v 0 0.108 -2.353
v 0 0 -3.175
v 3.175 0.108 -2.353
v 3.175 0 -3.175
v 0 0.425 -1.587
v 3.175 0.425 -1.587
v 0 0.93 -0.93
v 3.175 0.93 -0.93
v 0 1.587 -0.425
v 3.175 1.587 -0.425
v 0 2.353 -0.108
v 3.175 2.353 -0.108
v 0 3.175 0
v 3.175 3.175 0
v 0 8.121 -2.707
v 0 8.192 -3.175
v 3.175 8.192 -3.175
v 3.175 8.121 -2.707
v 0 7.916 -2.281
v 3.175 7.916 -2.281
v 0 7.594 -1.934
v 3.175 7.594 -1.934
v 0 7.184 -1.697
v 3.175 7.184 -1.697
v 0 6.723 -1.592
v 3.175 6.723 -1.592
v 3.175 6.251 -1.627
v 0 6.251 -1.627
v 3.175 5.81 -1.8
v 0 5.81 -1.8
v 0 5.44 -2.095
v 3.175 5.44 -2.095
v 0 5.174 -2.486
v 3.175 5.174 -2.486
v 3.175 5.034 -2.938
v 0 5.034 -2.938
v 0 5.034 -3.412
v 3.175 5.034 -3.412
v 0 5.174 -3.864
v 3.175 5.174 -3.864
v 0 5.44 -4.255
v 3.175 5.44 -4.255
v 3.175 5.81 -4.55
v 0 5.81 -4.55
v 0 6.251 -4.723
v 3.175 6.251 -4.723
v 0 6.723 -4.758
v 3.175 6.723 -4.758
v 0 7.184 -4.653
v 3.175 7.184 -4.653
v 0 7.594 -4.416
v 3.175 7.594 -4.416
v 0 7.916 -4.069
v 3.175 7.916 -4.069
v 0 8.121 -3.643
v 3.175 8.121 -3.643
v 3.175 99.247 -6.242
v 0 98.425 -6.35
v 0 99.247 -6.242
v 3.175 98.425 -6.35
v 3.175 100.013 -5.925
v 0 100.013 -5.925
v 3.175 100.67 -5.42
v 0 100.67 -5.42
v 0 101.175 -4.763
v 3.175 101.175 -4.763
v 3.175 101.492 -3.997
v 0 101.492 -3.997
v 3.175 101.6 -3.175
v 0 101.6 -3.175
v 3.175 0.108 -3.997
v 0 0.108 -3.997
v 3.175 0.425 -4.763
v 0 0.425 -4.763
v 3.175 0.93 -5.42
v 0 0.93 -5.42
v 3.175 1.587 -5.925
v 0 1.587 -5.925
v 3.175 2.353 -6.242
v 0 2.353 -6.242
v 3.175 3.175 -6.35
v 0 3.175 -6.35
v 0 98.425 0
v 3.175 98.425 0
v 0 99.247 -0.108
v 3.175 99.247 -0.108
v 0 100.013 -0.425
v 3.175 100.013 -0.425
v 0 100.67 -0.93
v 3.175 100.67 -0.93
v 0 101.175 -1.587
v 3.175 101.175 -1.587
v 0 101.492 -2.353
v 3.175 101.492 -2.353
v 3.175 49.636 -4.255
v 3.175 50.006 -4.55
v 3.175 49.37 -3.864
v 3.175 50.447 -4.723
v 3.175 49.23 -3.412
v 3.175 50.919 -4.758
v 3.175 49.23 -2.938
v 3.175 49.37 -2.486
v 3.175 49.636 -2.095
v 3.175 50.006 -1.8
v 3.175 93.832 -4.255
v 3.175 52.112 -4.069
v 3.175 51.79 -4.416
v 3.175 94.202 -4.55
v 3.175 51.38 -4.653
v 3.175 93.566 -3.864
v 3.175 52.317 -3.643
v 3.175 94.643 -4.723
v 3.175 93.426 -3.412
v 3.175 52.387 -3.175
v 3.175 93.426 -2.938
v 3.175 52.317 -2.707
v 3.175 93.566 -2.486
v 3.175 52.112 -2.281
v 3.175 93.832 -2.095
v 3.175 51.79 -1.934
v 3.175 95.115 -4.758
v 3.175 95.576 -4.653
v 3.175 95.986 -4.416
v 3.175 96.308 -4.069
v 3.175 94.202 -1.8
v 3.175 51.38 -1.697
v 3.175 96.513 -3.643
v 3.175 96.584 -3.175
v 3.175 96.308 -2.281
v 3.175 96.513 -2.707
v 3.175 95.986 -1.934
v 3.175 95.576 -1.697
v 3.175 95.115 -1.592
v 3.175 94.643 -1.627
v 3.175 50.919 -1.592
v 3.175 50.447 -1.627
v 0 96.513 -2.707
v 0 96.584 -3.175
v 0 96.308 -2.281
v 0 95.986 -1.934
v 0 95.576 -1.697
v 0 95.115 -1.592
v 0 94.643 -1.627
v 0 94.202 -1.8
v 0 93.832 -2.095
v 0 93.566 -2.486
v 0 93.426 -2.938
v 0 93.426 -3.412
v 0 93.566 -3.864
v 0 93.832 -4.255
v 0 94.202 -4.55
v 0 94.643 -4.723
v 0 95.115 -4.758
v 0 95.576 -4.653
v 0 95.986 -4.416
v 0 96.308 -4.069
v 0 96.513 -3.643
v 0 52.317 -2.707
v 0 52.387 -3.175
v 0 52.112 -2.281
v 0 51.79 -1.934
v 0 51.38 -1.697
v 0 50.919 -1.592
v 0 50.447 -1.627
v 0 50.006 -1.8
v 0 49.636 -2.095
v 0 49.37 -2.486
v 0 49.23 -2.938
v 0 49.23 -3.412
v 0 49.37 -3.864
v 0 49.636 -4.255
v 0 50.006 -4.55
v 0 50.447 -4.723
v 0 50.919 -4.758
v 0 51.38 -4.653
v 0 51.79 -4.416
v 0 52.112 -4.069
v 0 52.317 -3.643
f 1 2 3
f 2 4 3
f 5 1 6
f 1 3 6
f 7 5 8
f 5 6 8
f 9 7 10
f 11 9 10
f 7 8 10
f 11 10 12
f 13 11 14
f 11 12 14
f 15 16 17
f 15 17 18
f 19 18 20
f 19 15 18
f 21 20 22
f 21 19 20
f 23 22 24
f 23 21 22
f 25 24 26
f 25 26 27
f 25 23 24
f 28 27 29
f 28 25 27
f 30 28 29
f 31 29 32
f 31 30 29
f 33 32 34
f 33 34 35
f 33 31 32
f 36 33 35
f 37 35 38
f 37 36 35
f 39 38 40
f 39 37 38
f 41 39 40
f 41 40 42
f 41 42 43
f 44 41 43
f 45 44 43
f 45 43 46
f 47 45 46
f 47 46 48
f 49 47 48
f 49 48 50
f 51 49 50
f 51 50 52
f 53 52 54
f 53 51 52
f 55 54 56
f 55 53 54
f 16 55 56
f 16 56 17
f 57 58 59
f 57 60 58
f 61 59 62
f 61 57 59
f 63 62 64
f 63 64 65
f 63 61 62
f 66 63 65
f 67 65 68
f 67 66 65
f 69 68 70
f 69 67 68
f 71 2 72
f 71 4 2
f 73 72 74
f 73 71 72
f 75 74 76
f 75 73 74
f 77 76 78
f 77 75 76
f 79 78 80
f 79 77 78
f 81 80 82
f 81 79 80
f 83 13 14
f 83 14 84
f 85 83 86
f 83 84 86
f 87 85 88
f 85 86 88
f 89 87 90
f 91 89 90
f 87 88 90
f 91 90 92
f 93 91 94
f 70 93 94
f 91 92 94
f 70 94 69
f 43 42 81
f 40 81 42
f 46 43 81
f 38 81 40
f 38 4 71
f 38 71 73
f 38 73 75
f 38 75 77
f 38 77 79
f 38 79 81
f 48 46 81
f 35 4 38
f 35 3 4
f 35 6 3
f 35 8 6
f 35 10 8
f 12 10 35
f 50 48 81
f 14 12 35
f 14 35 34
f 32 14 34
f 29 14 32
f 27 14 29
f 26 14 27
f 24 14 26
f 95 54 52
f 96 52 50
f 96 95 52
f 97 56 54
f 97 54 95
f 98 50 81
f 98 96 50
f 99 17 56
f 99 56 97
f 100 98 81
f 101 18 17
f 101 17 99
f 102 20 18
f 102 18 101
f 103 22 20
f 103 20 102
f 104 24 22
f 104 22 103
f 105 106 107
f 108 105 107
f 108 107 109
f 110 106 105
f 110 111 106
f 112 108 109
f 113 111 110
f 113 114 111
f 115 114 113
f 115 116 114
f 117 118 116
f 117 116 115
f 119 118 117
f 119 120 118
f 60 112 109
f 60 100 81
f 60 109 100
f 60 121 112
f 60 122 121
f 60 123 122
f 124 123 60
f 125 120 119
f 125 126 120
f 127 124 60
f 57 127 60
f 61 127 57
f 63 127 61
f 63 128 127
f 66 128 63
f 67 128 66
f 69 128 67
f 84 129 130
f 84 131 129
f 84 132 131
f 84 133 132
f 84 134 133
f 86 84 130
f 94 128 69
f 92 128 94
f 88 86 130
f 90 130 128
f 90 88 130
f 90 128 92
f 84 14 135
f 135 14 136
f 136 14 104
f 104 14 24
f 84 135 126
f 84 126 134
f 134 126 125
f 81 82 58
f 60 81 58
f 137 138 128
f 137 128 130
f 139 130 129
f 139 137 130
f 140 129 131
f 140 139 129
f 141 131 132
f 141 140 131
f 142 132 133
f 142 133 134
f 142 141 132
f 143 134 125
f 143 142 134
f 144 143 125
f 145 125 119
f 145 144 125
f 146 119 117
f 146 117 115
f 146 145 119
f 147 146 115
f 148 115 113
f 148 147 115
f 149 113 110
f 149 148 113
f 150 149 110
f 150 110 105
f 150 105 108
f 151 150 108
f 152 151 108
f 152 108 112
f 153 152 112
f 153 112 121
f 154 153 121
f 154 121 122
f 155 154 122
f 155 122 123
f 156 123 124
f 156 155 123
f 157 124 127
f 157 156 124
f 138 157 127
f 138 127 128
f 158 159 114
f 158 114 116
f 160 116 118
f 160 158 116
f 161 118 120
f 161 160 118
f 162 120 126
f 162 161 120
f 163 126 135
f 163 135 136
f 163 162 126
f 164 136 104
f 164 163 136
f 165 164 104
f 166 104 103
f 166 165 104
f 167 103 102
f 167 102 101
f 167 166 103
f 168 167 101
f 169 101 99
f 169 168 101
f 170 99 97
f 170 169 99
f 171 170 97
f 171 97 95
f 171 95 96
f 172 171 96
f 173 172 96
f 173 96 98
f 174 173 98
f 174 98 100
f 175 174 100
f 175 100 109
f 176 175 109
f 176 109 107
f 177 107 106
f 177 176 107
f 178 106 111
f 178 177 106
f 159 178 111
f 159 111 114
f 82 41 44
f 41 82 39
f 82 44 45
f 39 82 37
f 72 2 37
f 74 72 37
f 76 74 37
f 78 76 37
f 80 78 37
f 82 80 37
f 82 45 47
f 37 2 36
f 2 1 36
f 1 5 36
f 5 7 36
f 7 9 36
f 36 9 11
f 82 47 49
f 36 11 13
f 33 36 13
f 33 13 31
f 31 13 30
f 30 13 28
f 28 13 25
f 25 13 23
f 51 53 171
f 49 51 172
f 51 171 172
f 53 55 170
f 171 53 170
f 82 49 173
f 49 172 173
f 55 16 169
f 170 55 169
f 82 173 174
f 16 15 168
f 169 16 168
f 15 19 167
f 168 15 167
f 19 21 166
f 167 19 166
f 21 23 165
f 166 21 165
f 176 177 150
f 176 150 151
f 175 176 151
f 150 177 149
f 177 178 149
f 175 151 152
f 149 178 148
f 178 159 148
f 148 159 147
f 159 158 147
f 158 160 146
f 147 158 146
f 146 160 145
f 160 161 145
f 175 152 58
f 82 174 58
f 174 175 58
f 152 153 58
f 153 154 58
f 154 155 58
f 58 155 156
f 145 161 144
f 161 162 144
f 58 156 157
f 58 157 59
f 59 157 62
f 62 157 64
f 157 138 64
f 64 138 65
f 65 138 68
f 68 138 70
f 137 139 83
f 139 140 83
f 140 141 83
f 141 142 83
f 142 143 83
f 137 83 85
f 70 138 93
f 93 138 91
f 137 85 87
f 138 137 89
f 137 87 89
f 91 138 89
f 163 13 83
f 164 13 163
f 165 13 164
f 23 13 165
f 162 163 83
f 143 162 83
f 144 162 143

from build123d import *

# Parameters (mm, degrees)
F0_W     = 101.6
F0_H     = 6.35
F0_R     = 1.5875
F1_DEPTH = 3.175
F2_R     = 3.17499
F3_R     = 3.17499


# Not quite as in the source:
# - a fillet or chamfer is up to 0.001 mm smaller than in the source, because OpenCascade refuses the exact size


with BuildPart() as f1:
    # F0 (on Right) → F1 (new body)
    with BuildSketch(Plane.YZ):
        with Locations((50.8, -3.175)):
            Rectangle(F0_W, F0_H)
        with Locations((6.604, -3.175)):
            Circle(F0_R, mode=Mode.SUBTRACT)
        with Locations((50.8, -3.175)):
            Circle(F0_R, mode=Mode.SUBTRACT)
        with Locations((94.996, -3.175)):
            Circle(F0_R, mode=Mode.SUBTRACT)
    extrude(amount=F1_DEPTH)

    # F2 (radius 3.175 in the source; OpenCascade refuses exactly that, so slightly less here)
    f2_edges = [f1.edges().sort_by_distance(p)[0] for p in [
        (1.5875, 0, 0),
        (1.5875, 0, -6.35),
    ]]
    fillet(f2_edges, radius=F2_R)

    # F3 (radius 3.175 in the source; OpenCascade refuses exactly that, so slightly less here)
    f3_edges = [f1.edges().sort_by_distance(p)[0] for p in [
        (1.5875, 101.6, 0),
        (1.5875, 101.6, -6.35),
    ]]
    fillet(f3_edges, radius=F3_R)


solid = f1.part
